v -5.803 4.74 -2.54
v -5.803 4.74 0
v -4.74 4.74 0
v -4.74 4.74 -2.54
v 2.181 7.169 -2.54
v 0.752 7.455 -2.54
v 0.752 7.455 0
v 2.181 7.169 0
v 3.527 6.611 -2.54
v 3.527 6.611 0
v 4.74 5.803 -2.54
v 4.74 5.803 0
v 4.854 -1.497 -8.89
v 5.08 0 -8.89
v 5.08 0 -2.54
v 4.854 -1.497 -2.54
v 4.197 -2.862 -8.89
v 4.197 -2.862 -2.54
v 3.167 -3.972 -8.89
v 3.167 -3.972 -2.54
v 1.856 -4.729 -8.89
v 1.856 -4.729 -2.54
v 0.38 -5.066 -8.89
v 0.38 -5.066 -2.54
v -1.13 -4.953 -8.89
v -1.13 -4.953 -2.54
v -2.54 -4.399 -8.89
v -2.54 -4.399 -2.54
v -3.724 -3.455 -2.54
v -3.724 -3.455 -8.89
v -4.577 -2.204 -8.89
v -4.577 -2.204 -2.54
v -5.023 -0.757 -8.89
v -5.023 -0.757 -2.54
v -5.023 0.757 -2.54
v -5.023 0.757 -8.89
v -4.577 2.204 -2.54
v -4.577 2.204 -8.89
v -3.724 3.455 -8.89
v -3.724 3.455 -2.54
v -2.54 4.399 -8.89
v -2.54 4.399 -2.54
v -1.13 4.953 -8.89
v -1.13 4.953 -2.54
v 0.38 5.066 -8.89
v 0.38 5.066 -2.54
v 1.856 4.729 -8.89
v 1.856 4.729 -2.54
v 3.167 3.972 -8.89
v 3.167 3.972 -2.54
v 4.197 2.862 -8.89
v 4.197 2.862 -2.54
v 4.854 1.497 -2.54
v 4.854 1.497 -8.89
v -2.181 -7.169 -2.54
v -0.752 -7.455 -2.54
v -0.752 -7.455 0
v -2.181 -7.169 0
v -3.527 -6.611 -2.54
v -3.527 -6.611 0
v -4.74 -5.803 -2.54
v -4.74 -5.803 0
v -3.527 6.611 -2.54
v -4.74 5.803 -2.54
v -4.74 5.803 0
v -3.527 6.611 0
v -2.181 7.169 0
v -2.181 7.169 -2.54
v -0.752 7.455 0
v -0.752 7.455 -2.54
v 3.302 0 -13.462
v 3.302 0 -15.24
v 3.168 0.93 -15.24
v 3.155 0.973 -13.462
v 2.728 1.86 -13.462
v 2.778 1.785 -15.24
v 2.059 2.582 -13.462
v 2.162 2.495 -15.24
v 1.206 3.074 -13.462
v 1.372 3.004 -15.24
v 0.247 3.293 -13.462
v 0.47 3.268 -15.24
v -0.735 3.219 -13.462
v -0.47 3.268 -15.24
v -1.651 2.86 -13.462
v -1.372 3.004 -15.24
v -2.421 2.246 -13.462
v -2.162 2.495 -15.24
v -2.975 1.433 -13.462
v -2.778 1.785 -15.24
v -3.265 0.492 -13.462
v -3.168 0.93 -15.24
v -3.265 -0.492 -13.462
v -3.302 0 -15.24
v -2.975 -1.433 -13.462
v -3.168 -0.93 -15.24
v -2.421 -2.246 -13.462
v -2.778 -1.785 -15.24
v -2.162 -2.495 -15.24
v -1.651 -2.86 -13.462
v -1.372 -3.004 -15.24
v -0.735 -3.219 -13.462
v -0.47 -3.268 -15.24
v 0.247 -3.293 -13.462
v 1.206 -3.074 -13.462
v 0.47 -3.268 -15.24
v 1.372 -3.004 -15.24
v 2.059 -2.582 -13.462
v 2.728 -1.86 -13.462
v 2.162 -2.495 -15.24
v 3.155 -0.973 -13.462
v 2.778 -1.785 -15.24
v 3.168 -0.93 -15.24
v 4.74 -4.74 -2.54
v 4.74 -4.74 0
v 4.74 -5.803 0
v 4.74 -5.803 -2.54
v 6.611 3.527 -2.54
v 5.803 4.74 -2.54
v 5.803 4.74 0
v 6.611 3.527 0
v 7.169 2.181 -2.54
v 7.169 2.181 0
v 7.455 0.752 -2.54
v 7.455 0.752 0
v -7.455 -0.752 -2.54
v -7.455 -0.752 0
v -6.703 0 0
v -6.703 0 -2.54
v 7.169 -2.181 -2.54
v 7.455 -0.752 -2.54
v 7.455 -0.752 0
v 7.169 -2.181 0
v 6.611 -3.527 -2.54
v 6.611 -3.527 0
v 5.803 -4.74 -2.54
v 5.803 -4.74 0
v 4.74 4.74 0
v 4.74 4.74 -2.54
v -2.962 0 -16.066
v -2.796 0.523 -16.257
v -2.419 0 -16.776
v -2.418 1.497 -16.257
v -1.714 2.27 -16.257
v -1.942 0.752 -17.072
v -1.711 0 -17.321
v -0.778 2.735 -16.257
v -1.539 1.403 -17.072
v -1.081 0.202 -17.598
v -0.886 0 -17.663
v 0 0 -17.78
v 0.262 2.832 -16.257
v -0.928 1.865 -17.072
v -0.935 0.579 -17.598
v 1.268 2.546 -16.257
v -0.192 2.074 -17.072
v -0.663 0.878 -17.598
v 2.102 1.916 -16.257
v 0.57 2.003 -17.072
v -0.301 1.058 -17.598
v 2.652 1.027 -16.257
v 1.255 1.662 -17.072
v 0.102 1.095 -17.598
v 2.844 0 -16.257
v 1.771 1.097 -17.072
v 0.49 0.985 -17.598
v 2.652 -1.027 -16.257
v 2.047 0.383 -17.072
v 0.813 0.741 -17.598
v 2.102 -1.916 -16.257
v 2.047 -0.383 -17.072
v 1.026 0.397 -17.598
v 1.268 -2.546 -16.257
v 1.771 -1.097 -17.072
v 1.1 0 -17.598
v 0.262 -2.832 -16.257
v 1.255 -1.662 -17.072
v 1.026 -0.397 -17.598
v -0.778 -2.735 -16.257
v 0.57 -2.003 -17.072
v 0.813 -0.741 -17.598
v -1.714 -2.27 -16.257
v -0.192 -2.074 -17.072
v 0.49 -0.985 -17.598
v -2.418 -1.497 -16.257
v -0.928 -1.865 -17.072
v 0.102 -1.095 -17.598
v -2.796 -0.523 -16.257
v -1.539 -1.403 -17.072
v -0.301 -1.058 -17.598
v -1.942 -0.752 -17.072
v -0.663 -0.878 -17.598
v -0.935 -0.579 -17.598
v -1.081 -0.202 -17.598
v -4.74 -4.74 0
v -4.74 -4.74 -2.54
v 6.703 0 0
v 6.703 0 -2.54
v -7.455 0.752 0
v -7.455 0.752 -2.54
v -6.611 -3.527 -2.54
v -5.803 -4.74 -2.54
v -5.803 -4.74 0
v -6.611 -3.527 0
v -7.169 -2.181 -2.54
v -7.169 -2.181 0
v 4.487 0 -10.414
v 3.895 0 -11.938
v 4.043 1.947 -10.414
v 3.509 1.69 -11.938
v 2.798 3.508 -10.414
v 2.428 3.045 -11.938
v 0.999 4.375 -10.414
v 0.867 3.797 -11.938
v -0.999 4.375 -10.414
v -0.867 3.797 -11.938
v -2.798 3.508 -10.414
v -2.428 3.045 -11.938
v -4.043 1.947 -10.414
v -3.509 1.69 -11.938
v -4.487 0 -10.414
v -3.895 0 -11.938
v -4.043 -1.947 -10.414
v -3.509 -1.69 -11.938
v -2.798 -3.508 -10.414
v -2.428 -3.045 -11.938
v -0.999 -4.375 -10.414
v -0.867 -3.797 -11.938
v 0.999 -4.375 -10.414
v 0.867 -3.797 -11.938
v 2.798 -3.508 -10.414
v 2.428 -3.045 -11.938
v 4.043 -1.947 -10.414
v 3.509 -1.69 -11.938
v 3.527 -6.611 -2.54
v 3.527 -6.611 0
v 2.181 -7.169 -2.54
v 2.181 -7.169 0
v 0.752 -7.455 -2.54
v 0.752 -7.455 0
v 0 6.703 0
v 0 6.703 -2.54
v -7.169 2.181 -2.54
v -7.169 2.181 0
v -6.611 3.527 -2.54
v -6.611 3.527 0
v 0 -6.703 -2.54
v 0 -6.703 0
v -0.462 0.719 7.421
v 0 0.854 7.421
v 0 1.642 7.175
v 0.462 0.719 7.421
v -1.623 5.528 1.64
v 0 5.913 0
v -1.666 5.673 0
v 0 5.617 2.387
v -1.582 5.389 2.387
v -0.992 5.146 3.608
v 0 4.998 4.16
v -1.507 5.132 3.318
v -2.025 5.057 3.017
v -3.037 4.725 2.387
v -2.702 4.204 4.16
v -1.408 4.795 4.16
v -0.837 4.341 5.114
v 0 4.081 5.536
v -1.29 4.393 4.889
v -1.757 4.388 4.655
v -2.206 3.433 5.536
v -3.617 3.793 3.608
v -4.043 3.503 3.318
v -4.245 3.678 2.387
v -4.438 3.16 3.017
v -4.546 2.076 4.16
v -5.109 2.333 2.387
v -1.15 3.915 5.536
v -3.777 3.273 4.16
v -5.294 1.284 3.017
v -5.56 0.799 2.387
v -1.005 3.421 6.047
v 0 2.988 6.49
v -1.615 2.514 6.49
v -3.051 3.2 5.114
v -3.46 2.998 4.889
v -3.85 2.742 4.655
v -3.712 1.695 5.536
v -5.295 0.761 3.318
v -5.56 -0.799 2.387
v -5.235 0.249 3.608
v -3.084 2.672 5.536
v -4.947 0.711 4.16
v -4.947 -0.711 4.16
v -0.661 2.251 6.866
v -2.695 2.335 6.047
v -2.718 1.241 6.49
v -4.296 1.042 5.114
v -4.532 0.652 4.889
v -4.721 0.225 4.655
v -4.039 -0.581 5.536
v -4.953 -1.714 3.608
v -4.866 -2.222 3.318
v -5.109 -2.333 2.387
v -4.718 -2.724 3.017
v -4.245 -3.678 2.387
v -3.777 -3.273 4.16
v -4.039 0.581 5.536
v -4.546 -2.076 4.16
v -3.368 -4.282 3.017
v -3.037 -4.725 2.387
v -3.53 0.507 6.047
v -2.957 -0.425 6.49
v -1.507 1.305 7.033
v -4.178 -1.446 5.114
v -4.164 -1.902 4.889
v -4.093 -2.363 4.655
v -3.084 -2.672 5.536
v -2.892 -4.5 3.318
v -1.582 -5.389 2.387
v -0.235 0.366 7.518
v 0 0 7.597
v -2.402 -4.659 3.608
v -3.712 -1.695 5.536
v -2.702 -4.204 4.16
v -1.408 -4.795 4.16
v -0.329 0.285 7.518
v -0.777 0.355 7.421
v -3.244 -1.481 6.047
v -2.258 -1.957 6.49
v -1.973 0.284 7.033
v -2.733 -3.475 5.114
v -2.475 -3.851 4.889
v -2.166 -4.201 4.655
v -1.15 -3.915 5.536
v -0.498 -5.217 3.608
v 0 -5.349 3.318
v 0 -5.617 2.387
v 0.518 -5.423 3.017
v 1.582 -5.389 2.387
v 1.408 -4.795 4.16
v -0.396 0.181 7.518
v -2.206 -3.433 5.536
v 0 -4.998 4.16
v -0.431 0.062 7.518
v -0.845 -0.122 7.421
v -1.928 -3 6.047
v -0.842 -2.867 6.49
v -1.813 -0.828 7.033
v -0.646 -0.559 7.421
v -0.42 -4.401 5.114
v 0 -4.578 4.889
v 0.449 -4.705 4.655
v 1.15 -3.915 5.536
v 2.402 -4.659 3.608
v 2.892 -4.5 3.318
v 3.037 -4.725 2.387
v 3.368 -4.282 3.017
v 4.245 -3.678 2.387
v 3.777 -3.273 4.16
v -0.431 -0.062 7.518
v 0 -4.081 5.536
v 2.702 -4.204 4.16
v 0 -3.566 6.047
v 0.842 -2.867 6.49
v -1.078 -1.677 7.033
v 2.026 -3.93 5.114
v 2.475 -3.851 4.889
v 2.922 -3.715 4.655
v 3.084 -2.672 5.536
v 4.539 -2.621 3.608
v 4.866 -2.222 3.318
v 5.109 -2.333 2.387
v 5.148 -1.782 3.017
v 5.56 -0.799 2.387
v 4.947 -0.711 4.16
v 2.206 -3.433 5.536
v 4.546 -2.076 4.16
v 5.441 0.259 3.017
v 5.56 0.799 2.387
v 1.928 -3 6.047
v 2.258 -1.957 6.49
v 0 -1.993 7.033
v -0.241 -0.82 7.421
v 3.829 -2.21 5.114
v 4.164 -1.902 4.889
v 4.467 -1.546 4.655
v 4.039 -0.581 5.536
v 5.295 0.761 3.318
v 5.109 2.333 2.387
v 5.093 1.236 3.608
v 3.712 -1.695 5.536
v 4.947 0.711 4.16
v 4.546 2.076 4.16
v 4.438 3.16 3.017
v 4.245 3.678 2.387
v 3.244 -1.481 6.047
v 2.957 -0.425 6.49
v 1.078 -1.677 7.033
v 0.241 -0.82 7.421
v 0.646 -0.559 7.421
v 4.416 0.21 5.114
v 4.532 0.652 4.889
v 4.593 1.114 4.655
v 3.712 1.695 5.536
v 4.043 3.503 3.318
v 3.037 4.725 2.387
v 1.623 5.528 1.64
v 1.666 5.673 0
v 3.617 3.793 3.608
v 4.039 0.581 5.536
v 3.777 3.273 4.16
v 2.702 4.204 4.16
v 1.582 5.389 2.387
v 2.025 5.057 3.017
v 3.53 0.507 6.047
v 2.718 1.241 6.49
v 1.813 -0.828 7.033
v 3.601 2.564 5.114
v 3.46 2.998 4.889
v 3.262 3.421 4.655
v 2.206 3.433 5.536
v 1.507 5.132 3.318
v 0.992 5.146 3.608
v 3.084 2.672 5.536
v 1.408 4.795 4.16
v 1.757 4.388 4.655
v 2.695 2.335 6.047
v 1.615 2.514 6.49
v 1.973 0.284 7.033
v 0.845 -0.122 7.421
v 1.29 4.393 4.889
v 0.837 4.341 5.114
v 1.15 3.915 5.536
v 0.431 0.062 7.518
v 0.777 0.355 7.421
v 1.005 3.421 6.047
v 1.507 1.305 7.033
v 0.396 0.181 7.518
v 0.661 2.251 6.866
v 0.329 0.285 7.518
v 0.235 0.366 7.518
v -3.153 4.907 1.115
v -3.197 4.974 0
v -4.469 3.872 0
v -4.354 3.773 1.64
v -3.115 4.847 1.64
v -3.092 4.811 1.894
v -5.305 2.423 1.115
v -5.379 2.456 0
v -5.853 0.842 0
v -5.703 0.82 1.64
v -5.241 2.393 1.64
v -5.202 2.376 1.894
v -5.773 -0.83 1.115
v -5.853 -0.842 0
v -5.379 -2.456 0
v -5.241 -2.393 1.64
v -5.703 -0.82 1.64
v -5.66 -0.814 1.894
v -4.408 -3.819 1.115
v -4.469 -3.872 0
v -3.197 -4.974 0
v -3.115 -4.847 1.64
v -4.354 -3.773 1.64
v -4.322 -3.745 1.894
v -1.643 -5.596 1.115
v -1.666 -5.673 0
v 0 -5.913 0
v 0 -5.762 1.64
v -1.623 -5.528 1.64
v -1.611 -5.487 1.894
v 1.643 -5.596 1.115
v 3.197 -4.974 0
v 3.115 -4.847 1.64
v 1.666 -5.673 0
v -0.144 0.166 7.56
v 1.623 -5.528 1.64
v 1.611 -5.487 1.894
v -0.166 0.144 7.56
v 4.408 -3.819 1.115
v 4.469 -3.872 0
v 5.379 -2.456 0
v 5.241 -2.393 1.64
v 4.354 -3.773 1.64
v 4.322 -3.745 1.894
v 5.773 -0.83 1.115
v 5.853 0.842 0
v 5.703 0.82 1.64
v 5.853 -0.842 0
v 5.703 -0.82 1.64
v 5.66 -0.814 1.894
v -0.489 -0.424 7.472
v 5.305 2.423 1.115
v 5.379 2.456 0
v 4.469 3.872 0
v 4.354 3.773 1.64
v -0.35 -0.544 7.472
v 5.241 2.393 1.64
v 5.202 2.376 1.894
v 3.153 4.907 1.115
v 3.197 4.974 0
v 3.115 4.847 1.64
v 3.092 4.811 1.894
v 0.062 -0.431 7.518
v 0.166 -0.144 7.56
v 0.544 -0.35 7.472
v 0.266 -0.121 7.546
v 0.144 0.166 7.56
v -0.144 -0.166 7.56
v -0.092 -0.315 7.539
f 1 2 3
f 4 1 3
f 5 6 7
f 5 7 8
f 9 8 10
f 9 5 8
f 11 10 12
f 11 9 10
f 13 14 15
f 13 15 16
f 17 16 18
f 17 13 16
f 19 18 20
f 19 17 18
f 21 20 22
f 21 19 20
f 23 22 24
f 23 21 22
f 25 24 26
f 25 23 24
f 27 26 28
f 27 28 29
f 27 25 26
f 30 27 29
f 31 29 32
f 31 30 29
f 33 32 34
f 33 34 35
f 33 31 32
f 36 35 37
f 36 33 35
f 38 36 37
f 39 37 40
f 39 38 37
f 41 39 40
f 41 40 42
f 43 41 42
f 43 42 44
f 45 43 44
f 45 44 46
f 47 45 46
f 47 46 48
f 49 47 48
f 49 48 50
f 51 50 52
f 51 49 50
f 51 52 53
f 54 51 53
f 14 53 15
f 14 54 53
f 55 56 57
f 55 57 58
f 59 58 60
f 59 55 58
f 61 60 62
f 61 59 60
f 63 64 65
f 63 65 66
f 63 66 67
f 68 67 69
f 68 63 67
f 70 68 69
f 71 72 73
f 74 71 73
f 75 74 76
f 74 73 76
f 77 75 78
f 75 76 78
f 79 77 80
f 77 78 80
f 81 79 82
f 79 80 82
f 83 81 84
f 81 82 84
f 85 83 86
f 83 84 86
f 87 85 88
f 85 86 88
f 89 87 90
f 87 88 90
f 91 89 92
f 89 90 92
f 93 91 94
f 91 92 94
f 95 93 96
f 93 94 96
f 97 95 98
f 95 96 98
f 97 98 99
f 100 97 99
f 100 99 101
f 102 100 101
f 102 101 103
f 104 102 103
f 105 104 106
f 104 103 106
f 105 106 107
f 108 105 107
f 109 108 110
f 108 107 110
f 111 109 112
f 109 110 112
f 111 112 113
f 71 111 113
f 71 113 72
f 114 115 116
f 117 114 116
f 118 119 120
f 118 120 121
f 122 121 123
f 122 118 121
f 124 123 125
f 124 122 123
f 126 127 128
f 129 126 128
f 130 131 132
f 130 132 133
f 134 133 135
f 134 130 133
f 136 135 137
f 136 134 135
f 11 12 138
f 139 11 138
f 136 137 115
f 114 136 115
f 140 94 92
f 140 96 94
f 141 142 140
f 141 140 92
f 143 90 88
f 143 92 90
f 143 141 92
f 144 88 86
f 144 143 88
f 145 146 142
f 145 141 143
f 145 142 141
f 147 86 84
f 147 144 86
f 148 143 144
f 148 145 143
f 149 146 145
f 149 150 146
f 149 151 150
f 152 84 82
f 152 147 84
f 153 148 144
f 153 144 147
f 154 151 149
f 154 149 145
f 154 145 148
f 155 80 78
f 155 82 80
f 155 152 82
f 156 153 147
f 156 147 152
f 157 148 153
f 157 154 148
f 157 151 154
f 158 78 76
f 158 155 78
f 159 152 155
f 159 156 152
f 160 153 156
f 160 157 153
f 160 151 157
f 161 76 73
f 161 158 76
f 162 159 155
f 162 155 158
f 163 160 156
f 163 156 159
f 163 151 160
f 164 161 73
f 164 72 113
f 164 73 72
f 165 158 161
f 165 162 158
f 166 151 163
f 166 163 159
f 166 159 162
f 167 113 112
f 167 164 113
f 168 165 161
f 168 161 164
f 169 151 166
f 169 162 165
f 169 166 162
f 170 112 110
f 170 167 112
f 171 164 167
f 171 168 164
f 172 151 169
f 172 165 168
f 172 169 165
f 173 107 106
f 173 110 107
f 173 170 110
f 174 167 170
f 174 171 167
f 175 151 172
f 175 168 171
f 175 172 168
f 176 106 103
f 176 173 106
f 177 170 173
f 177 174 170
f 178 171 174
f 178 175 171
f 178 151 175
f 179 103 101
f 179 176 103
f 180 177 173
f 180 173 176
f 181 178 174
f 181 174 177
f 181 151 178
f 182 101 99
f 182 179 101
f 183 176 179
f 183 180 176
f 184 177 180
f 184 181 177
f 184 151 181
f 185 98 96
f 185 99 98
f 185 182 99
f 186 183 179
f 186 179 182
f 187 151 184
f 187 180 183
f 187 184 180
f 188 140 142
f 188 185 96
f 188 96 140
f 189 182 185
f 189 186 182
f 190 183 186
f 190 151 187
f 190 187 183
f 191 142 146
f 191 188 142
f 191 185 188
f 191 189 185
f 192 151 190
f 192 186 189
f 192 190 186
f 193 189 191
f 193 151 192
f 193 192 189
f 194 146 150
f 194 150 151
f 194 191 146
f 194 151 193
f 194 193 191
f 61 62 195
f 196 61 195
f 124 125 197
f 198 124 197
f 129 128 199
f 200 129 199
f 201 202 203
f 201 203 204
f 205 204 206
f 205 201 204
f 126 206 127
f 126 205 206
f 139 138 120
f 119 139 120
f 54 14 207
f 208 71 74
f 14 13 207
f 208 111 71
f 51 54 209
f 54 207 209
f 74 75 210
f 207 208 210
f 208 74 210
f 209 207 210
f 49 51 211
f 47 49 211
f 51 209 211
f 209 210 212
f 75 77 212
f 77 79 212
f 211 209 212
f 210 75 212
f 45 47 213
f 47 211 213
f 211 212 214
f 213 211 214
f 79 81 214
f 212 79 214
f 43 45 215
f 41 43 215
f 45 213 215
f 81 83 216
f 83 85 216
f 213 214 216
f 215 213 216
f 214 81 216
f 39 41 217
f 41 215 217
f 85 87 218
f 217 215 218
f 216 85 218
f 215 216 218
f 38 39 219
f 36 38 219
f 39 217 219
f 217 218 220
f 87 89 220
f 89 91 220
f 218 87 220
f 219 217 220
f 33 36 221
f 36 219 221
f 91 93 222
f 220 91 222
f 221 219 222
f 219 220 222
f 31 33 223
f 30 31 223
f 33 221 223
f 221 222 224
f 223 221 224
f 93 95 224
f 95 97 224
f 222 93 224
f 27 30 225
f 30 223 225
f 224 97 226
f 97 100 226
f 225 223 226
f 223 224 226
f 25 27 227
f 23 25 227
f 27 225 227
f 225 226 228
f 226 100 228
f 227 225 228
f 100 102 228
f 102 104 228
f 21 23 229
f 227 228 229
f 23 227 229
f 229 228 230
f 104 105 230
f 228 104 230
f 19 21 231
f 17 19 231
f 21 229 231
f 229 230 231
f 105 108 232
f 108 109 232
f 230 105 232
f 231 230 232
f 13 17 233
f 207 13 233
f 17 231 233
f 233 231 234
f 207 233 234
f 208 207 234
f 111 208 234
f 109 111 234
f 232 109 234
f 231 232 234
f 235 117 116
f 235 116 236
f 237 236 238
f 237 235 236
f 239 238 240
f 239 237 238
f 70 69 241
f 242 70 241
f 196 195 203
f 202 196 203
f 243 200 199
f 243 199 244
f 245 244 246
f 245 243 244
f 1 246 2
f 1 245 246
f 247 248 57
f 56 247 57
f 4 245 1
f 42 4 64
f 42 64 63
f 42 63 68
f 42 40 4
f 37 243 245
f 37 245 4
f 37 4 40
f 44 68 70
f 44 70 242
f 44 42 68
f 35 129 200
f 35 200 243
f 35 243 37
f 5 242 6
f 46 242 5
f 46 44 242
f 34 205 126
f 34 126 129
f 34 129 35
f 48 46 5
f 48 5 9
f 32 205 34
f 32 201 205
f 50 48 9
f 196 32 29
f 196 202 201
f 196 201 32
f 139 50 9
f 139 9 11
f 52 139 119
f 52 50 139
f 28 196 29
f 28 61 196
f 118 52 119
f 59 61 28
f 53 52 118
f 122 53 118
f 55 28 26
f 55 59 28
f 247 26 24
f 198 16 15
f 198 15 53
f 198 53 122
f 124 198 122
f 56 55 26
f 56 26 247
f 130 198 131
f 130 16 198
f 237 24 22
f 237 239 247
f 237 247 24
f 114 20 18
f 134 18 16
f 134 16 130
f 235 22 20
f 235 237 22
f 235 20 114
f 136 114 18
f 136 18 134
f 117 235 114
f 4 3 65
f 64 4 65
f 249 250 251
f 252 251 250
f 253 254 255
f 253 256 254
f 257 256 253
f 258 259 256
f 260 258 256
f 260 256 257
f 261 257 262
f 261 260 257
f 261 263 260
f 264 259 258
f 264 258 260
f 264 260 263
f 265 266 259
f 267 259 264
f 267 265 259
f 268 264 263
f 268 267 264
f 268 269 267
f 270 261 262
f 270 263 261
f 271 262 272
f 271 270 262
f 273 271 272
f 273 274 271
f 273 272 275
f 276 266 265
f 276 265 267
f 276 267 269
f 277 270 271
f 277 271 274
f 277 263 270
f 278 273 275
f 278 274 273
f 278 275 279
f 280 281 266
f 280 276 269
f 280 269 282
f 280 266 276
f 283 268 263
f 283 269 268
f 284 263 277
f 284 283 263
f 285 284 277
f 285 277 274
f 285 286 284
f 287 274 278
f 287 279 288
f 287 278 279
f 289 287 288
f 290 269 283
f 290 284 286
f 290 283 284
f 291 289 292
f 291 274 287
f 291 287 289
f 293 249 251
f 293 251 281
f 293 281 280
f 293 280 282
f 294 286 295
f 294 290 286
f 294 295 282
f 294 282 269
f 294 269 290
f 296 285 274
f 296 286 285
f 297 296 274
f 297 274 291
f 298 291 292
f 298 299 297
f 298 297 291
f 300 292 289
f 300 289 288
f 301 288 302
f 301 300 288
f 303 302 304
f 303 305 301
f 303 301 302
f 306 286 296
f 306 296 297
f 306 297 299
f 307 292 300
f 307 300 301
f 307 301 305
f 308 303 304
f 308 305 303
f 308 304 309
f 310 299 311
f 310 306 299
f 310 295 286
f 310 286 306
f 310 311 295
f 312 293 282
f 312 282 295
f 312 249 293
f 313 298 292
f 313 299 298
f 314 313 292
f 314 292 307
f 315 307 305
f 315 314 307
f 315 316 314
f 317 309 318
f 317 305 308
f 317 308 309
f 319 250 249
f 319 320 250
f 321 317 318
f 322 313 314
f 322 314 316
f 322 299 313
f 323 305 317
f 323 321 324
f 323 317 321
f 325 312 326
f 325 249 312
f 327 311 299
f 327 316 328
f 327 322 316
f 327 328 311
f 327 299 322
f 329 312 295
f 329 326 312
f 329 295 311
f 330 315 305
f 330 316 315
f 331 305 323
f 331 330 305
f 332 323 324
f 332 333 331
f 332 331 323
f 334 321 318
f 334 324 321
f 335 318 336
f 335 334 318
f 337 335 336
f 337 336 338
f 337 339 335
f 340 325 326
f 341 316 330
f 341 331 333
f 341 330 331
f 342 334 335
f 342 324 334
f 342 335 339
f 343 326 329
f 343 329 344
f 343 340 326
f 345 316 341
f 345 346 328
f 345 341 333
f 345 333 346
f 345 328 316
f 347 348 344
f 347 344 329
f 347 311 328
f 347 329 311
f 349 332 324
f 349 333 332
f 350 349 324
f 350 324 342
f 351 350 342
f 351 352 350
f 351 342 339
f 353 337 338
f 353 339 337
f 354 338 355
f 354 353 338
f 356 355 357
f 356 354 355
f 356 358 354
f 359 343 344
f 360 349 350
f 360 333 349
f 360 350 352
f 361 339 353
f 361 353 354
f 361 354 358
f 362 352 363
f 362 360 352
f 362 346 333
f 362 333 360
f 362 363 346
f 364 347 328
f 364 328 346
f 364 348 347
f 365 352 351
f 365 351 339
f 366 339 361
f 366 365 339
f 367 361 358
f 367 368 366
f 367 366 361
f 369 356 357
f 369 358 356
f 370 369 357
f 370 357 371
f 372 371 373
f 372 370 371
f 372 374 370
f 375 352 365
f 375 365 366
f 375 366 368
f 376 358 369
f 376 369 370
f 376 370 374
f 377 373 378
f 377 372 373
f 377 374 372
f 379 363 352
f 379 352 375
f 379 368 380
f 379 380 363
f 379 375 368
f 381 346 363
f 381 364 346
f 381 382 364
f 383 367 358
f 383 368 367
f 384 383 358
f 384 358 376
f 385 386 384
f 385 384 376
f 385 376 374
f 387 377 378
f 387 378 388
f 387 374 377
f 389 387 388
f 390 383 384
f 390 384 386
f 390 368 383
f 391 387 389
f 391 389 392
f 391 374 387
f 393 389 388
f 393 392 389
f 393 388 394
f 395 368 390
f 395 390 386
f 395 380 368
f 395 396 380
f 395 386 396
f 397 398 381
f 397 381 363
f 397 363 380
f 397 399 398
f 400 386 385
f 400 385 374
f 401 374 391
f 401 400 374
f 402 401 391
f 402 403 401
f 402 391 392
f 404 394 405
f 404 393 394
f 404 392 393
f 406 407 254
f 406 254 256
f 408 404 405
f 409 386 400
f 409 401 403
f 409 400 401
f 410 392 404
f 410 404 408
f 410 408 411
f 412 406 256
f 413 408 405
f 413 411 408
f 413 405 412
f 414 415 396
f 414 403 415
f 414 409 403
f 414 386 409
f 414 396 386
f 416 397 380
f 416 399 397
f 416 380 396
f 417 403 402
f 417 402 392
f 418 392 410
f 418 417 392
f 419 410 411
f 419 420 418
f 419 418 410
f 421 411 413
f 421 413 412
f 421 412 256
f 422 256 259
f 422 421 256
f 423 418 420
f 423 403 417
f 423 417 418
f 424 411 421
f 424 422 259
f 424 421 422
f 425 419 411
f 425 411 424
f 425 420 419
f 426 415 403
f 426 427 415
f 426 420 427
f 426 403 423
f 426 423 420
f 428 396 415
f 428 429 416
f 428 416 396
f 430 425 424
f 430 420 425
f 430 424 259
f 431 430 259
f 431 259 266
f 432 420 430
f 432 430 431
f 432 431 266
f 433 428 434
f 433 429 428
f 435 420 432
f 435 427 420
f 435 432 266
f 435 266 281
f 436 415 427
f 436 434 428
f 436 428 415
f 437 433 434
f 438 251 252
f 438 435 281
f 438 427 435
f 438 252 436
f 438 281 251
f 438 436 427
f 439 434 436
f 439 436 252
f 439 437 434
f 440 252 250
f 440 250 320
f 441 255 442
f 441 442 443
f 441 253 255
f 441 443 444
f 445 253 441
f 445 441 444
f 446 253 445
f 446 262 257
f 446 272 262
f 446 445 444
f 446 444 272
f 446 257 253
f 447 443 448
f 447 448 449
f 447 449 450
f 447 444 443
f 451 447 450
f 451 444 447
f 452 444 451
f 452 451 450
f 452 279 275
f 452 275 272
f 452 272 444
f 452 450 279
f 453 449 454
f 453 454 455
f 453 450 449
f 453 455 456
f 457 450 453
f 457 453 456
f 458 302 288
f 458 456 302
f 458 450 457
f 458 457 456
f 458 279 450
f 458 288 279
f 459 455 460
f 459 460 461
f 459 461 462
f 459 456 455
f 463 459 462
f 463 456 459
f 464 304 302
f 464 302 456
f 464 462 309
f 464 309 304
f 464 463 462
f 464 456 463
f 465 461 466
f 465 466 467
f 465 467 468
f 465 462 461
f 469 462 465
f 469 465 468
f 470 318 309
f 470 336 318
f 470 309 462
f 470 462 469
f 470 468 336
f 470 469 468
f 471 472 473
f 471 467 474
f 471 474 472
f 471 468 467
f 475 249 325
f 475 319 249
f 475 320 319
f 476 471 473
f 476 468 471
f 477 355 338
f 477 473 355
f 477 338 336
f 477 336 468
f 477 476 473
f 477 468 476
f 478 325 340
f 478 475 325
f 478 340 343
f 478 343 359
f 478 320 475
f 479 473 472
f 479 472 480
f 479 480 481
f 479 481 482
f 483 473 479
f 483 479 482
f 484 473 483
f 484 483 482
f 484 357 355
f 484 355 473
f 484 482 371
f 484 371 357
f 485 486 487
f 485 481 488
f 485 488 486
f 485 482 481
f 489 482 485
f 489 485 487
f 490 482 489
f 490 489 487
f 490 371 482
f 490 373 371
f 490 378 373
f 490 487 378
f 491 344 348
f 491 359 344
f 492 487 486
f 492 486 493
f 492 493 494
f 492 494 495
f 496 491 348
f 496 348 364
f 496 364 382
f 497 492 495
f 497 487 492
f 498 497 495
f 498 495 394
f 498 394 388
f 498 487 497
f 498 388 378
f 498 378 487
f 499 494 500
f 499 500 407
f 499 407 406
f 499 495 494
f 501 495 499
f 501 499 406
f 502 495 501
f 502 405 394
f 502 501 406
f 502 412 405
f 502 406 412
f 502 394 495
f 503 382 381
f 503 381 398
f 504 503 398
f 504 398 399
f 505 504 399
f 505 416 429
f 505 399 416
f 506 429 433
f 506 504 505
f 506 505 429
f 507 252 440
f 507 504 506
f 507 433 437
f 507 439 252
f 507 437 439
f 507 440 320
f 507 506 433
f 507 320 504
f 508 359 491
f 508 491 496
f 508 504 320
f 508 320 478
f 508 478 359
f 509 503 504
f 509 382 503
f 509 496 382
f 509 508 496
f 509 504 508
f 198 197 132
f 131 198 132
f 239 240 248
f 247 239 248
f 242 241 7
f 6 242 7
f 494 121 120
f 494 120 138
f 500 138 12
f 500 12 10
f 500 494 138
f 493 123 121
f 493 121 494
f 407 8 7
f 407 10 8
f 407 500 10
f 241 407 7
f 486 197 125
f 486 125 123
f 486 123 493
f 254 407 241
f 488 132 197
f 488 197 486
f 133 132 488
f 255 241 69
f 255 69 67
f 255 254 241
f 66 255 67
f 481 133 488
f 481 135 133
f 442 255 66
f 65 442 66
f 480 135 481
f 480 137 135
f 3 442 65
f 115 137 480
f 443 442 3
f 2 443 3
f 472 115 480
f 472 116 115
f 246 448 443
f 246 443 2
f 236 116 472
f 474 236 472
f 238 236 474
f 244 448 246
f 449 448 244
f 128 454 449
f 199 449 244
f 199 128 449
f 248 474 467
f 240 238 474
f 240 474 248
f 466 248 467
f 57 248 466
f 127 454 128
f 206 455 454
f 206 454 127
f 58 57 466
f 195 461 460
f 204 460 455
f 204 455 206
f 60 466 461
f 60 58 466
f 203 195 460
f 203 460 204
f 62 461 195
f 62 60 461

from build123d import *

# Parameters (mm, degrees)
DOME1_FACE_RADIUS  = 3.302
DOME1_HEIGHT       = 2.54
CUT_EXTRUDE1_DEPTH = 21.698272826
SEED_CUT_COUNT     = 8


# Read off the part's stored shape, not the designer's step: Cut-Revolve-Thin1
with BuildPart() as part:
    # Sketch1 → Revolve1 (revolve)
    with BuildSketch(Plane(origin=(0, 0, 0), x_dir=(0, 0, -1), z_dir=(1, 0, 0)), mode=Mode.PRIVATE) as revolve1_sk:
        Polygon((0, 0), (0, 7.493), (2.54, 7.493), (2.54, 5.08), (15.24, 5.08), (15.24, 0), align=None)
    revolve(revolve1_sk.sketch.rotate(Axis((0, 0, 12.712464269), (0, 0, -1)), 90), axis=Axis((0, 0, 12.712464269), (0, 0, -1)))

    # Sketch2 → Revolve2 (revolve)
    with BuildSketch(Plane(origin=(0, 0, 0), x_dir=(0, 0, -1), z_dir=(1, 0, 0))):
        with BuildLine():
            Line((0, 0), (-7.597075699, 0))
            add(Edge.make_bspline(
                [(0, 5.913009527), (-6.698434988, 5.682543743), (-7.597075699, 0)],
                knots=[0, 0, 0, 1, 1, 1], degree=2))
            Line((0, 5.913009527), (0, 0))
        make_face()
    revolve(axis=Axis((0, 0, 12.712464269), (0, 0, 1)))

    # Cut-Revolve-Thin1 outline → Cut-Revolve-Thin1 (revolve, cut)
    with BuildSketch(Plane.XZ):
        Polygon((5.08, -8.89), (3.302, -13.462), (3.302, -15.24), (5.08, -15.24), align=None)
    revolve(axis=Axis((0, 0, 0), (0, 0, 1)), mode=Mode.SUBTRACT)

    # Dome1: a dome of height H over a round flat face of radius A is a cap of a sphere of radius (A * A + H * H) / (2 * H)
    dome1_r = (DOME1_FACE_RADIUS * DOME1_FACE_RADIUS + DOME1_HEIGHT * DOME1_HEIGHT) / (2 * DOME1_HEIGHT)
    dome1_base = Plane((0, 0, -15.24), z_dir=(0, 0, -1))
    with Locations(dome1_base.offset(DOME1_HEIGHT - dome1_r)):
        dome1_ball = Sphere(dome1_r, mode=Mode.PRIVATE)
    add(split(dome1_ball, bisect_by=dome1_base, keep=Keep.TOP, mode=Mode.PRIVATE))

    # Sketch4 → Cut-Extrude1 (cut, through all)
    with BuildSketch(Plane.XY):
        with BuildLine():
            Line((0, 6.703004763), (0.752149198, 7.455153961))
            ThreePointArc((0.752149198, 7.455153961), (0, 7.493), (-0.752149198, 7.455153961))
            Line((-0.752149198, 7.455153961), (0, 6.703004763))
        make_face()
    cut_extrude1 = extrude(amount=-CUT_EXTRUDE1_DEPTH, mode=Mode.SUBTRACT)

    # Seed Cut: Cut-Extrude1 ×8 about axis
    seed_cut_axis = Axis((0, 0, 0), (0, 0, 1))
    for i in range(1, SEED_CUT_COUNT):
        add(cut_extrude1.rotate(seed_cut_axis, i * 360 / SEED_CUT_COUNT), mode=Mode.SUBTRACT)


solid = part.part
